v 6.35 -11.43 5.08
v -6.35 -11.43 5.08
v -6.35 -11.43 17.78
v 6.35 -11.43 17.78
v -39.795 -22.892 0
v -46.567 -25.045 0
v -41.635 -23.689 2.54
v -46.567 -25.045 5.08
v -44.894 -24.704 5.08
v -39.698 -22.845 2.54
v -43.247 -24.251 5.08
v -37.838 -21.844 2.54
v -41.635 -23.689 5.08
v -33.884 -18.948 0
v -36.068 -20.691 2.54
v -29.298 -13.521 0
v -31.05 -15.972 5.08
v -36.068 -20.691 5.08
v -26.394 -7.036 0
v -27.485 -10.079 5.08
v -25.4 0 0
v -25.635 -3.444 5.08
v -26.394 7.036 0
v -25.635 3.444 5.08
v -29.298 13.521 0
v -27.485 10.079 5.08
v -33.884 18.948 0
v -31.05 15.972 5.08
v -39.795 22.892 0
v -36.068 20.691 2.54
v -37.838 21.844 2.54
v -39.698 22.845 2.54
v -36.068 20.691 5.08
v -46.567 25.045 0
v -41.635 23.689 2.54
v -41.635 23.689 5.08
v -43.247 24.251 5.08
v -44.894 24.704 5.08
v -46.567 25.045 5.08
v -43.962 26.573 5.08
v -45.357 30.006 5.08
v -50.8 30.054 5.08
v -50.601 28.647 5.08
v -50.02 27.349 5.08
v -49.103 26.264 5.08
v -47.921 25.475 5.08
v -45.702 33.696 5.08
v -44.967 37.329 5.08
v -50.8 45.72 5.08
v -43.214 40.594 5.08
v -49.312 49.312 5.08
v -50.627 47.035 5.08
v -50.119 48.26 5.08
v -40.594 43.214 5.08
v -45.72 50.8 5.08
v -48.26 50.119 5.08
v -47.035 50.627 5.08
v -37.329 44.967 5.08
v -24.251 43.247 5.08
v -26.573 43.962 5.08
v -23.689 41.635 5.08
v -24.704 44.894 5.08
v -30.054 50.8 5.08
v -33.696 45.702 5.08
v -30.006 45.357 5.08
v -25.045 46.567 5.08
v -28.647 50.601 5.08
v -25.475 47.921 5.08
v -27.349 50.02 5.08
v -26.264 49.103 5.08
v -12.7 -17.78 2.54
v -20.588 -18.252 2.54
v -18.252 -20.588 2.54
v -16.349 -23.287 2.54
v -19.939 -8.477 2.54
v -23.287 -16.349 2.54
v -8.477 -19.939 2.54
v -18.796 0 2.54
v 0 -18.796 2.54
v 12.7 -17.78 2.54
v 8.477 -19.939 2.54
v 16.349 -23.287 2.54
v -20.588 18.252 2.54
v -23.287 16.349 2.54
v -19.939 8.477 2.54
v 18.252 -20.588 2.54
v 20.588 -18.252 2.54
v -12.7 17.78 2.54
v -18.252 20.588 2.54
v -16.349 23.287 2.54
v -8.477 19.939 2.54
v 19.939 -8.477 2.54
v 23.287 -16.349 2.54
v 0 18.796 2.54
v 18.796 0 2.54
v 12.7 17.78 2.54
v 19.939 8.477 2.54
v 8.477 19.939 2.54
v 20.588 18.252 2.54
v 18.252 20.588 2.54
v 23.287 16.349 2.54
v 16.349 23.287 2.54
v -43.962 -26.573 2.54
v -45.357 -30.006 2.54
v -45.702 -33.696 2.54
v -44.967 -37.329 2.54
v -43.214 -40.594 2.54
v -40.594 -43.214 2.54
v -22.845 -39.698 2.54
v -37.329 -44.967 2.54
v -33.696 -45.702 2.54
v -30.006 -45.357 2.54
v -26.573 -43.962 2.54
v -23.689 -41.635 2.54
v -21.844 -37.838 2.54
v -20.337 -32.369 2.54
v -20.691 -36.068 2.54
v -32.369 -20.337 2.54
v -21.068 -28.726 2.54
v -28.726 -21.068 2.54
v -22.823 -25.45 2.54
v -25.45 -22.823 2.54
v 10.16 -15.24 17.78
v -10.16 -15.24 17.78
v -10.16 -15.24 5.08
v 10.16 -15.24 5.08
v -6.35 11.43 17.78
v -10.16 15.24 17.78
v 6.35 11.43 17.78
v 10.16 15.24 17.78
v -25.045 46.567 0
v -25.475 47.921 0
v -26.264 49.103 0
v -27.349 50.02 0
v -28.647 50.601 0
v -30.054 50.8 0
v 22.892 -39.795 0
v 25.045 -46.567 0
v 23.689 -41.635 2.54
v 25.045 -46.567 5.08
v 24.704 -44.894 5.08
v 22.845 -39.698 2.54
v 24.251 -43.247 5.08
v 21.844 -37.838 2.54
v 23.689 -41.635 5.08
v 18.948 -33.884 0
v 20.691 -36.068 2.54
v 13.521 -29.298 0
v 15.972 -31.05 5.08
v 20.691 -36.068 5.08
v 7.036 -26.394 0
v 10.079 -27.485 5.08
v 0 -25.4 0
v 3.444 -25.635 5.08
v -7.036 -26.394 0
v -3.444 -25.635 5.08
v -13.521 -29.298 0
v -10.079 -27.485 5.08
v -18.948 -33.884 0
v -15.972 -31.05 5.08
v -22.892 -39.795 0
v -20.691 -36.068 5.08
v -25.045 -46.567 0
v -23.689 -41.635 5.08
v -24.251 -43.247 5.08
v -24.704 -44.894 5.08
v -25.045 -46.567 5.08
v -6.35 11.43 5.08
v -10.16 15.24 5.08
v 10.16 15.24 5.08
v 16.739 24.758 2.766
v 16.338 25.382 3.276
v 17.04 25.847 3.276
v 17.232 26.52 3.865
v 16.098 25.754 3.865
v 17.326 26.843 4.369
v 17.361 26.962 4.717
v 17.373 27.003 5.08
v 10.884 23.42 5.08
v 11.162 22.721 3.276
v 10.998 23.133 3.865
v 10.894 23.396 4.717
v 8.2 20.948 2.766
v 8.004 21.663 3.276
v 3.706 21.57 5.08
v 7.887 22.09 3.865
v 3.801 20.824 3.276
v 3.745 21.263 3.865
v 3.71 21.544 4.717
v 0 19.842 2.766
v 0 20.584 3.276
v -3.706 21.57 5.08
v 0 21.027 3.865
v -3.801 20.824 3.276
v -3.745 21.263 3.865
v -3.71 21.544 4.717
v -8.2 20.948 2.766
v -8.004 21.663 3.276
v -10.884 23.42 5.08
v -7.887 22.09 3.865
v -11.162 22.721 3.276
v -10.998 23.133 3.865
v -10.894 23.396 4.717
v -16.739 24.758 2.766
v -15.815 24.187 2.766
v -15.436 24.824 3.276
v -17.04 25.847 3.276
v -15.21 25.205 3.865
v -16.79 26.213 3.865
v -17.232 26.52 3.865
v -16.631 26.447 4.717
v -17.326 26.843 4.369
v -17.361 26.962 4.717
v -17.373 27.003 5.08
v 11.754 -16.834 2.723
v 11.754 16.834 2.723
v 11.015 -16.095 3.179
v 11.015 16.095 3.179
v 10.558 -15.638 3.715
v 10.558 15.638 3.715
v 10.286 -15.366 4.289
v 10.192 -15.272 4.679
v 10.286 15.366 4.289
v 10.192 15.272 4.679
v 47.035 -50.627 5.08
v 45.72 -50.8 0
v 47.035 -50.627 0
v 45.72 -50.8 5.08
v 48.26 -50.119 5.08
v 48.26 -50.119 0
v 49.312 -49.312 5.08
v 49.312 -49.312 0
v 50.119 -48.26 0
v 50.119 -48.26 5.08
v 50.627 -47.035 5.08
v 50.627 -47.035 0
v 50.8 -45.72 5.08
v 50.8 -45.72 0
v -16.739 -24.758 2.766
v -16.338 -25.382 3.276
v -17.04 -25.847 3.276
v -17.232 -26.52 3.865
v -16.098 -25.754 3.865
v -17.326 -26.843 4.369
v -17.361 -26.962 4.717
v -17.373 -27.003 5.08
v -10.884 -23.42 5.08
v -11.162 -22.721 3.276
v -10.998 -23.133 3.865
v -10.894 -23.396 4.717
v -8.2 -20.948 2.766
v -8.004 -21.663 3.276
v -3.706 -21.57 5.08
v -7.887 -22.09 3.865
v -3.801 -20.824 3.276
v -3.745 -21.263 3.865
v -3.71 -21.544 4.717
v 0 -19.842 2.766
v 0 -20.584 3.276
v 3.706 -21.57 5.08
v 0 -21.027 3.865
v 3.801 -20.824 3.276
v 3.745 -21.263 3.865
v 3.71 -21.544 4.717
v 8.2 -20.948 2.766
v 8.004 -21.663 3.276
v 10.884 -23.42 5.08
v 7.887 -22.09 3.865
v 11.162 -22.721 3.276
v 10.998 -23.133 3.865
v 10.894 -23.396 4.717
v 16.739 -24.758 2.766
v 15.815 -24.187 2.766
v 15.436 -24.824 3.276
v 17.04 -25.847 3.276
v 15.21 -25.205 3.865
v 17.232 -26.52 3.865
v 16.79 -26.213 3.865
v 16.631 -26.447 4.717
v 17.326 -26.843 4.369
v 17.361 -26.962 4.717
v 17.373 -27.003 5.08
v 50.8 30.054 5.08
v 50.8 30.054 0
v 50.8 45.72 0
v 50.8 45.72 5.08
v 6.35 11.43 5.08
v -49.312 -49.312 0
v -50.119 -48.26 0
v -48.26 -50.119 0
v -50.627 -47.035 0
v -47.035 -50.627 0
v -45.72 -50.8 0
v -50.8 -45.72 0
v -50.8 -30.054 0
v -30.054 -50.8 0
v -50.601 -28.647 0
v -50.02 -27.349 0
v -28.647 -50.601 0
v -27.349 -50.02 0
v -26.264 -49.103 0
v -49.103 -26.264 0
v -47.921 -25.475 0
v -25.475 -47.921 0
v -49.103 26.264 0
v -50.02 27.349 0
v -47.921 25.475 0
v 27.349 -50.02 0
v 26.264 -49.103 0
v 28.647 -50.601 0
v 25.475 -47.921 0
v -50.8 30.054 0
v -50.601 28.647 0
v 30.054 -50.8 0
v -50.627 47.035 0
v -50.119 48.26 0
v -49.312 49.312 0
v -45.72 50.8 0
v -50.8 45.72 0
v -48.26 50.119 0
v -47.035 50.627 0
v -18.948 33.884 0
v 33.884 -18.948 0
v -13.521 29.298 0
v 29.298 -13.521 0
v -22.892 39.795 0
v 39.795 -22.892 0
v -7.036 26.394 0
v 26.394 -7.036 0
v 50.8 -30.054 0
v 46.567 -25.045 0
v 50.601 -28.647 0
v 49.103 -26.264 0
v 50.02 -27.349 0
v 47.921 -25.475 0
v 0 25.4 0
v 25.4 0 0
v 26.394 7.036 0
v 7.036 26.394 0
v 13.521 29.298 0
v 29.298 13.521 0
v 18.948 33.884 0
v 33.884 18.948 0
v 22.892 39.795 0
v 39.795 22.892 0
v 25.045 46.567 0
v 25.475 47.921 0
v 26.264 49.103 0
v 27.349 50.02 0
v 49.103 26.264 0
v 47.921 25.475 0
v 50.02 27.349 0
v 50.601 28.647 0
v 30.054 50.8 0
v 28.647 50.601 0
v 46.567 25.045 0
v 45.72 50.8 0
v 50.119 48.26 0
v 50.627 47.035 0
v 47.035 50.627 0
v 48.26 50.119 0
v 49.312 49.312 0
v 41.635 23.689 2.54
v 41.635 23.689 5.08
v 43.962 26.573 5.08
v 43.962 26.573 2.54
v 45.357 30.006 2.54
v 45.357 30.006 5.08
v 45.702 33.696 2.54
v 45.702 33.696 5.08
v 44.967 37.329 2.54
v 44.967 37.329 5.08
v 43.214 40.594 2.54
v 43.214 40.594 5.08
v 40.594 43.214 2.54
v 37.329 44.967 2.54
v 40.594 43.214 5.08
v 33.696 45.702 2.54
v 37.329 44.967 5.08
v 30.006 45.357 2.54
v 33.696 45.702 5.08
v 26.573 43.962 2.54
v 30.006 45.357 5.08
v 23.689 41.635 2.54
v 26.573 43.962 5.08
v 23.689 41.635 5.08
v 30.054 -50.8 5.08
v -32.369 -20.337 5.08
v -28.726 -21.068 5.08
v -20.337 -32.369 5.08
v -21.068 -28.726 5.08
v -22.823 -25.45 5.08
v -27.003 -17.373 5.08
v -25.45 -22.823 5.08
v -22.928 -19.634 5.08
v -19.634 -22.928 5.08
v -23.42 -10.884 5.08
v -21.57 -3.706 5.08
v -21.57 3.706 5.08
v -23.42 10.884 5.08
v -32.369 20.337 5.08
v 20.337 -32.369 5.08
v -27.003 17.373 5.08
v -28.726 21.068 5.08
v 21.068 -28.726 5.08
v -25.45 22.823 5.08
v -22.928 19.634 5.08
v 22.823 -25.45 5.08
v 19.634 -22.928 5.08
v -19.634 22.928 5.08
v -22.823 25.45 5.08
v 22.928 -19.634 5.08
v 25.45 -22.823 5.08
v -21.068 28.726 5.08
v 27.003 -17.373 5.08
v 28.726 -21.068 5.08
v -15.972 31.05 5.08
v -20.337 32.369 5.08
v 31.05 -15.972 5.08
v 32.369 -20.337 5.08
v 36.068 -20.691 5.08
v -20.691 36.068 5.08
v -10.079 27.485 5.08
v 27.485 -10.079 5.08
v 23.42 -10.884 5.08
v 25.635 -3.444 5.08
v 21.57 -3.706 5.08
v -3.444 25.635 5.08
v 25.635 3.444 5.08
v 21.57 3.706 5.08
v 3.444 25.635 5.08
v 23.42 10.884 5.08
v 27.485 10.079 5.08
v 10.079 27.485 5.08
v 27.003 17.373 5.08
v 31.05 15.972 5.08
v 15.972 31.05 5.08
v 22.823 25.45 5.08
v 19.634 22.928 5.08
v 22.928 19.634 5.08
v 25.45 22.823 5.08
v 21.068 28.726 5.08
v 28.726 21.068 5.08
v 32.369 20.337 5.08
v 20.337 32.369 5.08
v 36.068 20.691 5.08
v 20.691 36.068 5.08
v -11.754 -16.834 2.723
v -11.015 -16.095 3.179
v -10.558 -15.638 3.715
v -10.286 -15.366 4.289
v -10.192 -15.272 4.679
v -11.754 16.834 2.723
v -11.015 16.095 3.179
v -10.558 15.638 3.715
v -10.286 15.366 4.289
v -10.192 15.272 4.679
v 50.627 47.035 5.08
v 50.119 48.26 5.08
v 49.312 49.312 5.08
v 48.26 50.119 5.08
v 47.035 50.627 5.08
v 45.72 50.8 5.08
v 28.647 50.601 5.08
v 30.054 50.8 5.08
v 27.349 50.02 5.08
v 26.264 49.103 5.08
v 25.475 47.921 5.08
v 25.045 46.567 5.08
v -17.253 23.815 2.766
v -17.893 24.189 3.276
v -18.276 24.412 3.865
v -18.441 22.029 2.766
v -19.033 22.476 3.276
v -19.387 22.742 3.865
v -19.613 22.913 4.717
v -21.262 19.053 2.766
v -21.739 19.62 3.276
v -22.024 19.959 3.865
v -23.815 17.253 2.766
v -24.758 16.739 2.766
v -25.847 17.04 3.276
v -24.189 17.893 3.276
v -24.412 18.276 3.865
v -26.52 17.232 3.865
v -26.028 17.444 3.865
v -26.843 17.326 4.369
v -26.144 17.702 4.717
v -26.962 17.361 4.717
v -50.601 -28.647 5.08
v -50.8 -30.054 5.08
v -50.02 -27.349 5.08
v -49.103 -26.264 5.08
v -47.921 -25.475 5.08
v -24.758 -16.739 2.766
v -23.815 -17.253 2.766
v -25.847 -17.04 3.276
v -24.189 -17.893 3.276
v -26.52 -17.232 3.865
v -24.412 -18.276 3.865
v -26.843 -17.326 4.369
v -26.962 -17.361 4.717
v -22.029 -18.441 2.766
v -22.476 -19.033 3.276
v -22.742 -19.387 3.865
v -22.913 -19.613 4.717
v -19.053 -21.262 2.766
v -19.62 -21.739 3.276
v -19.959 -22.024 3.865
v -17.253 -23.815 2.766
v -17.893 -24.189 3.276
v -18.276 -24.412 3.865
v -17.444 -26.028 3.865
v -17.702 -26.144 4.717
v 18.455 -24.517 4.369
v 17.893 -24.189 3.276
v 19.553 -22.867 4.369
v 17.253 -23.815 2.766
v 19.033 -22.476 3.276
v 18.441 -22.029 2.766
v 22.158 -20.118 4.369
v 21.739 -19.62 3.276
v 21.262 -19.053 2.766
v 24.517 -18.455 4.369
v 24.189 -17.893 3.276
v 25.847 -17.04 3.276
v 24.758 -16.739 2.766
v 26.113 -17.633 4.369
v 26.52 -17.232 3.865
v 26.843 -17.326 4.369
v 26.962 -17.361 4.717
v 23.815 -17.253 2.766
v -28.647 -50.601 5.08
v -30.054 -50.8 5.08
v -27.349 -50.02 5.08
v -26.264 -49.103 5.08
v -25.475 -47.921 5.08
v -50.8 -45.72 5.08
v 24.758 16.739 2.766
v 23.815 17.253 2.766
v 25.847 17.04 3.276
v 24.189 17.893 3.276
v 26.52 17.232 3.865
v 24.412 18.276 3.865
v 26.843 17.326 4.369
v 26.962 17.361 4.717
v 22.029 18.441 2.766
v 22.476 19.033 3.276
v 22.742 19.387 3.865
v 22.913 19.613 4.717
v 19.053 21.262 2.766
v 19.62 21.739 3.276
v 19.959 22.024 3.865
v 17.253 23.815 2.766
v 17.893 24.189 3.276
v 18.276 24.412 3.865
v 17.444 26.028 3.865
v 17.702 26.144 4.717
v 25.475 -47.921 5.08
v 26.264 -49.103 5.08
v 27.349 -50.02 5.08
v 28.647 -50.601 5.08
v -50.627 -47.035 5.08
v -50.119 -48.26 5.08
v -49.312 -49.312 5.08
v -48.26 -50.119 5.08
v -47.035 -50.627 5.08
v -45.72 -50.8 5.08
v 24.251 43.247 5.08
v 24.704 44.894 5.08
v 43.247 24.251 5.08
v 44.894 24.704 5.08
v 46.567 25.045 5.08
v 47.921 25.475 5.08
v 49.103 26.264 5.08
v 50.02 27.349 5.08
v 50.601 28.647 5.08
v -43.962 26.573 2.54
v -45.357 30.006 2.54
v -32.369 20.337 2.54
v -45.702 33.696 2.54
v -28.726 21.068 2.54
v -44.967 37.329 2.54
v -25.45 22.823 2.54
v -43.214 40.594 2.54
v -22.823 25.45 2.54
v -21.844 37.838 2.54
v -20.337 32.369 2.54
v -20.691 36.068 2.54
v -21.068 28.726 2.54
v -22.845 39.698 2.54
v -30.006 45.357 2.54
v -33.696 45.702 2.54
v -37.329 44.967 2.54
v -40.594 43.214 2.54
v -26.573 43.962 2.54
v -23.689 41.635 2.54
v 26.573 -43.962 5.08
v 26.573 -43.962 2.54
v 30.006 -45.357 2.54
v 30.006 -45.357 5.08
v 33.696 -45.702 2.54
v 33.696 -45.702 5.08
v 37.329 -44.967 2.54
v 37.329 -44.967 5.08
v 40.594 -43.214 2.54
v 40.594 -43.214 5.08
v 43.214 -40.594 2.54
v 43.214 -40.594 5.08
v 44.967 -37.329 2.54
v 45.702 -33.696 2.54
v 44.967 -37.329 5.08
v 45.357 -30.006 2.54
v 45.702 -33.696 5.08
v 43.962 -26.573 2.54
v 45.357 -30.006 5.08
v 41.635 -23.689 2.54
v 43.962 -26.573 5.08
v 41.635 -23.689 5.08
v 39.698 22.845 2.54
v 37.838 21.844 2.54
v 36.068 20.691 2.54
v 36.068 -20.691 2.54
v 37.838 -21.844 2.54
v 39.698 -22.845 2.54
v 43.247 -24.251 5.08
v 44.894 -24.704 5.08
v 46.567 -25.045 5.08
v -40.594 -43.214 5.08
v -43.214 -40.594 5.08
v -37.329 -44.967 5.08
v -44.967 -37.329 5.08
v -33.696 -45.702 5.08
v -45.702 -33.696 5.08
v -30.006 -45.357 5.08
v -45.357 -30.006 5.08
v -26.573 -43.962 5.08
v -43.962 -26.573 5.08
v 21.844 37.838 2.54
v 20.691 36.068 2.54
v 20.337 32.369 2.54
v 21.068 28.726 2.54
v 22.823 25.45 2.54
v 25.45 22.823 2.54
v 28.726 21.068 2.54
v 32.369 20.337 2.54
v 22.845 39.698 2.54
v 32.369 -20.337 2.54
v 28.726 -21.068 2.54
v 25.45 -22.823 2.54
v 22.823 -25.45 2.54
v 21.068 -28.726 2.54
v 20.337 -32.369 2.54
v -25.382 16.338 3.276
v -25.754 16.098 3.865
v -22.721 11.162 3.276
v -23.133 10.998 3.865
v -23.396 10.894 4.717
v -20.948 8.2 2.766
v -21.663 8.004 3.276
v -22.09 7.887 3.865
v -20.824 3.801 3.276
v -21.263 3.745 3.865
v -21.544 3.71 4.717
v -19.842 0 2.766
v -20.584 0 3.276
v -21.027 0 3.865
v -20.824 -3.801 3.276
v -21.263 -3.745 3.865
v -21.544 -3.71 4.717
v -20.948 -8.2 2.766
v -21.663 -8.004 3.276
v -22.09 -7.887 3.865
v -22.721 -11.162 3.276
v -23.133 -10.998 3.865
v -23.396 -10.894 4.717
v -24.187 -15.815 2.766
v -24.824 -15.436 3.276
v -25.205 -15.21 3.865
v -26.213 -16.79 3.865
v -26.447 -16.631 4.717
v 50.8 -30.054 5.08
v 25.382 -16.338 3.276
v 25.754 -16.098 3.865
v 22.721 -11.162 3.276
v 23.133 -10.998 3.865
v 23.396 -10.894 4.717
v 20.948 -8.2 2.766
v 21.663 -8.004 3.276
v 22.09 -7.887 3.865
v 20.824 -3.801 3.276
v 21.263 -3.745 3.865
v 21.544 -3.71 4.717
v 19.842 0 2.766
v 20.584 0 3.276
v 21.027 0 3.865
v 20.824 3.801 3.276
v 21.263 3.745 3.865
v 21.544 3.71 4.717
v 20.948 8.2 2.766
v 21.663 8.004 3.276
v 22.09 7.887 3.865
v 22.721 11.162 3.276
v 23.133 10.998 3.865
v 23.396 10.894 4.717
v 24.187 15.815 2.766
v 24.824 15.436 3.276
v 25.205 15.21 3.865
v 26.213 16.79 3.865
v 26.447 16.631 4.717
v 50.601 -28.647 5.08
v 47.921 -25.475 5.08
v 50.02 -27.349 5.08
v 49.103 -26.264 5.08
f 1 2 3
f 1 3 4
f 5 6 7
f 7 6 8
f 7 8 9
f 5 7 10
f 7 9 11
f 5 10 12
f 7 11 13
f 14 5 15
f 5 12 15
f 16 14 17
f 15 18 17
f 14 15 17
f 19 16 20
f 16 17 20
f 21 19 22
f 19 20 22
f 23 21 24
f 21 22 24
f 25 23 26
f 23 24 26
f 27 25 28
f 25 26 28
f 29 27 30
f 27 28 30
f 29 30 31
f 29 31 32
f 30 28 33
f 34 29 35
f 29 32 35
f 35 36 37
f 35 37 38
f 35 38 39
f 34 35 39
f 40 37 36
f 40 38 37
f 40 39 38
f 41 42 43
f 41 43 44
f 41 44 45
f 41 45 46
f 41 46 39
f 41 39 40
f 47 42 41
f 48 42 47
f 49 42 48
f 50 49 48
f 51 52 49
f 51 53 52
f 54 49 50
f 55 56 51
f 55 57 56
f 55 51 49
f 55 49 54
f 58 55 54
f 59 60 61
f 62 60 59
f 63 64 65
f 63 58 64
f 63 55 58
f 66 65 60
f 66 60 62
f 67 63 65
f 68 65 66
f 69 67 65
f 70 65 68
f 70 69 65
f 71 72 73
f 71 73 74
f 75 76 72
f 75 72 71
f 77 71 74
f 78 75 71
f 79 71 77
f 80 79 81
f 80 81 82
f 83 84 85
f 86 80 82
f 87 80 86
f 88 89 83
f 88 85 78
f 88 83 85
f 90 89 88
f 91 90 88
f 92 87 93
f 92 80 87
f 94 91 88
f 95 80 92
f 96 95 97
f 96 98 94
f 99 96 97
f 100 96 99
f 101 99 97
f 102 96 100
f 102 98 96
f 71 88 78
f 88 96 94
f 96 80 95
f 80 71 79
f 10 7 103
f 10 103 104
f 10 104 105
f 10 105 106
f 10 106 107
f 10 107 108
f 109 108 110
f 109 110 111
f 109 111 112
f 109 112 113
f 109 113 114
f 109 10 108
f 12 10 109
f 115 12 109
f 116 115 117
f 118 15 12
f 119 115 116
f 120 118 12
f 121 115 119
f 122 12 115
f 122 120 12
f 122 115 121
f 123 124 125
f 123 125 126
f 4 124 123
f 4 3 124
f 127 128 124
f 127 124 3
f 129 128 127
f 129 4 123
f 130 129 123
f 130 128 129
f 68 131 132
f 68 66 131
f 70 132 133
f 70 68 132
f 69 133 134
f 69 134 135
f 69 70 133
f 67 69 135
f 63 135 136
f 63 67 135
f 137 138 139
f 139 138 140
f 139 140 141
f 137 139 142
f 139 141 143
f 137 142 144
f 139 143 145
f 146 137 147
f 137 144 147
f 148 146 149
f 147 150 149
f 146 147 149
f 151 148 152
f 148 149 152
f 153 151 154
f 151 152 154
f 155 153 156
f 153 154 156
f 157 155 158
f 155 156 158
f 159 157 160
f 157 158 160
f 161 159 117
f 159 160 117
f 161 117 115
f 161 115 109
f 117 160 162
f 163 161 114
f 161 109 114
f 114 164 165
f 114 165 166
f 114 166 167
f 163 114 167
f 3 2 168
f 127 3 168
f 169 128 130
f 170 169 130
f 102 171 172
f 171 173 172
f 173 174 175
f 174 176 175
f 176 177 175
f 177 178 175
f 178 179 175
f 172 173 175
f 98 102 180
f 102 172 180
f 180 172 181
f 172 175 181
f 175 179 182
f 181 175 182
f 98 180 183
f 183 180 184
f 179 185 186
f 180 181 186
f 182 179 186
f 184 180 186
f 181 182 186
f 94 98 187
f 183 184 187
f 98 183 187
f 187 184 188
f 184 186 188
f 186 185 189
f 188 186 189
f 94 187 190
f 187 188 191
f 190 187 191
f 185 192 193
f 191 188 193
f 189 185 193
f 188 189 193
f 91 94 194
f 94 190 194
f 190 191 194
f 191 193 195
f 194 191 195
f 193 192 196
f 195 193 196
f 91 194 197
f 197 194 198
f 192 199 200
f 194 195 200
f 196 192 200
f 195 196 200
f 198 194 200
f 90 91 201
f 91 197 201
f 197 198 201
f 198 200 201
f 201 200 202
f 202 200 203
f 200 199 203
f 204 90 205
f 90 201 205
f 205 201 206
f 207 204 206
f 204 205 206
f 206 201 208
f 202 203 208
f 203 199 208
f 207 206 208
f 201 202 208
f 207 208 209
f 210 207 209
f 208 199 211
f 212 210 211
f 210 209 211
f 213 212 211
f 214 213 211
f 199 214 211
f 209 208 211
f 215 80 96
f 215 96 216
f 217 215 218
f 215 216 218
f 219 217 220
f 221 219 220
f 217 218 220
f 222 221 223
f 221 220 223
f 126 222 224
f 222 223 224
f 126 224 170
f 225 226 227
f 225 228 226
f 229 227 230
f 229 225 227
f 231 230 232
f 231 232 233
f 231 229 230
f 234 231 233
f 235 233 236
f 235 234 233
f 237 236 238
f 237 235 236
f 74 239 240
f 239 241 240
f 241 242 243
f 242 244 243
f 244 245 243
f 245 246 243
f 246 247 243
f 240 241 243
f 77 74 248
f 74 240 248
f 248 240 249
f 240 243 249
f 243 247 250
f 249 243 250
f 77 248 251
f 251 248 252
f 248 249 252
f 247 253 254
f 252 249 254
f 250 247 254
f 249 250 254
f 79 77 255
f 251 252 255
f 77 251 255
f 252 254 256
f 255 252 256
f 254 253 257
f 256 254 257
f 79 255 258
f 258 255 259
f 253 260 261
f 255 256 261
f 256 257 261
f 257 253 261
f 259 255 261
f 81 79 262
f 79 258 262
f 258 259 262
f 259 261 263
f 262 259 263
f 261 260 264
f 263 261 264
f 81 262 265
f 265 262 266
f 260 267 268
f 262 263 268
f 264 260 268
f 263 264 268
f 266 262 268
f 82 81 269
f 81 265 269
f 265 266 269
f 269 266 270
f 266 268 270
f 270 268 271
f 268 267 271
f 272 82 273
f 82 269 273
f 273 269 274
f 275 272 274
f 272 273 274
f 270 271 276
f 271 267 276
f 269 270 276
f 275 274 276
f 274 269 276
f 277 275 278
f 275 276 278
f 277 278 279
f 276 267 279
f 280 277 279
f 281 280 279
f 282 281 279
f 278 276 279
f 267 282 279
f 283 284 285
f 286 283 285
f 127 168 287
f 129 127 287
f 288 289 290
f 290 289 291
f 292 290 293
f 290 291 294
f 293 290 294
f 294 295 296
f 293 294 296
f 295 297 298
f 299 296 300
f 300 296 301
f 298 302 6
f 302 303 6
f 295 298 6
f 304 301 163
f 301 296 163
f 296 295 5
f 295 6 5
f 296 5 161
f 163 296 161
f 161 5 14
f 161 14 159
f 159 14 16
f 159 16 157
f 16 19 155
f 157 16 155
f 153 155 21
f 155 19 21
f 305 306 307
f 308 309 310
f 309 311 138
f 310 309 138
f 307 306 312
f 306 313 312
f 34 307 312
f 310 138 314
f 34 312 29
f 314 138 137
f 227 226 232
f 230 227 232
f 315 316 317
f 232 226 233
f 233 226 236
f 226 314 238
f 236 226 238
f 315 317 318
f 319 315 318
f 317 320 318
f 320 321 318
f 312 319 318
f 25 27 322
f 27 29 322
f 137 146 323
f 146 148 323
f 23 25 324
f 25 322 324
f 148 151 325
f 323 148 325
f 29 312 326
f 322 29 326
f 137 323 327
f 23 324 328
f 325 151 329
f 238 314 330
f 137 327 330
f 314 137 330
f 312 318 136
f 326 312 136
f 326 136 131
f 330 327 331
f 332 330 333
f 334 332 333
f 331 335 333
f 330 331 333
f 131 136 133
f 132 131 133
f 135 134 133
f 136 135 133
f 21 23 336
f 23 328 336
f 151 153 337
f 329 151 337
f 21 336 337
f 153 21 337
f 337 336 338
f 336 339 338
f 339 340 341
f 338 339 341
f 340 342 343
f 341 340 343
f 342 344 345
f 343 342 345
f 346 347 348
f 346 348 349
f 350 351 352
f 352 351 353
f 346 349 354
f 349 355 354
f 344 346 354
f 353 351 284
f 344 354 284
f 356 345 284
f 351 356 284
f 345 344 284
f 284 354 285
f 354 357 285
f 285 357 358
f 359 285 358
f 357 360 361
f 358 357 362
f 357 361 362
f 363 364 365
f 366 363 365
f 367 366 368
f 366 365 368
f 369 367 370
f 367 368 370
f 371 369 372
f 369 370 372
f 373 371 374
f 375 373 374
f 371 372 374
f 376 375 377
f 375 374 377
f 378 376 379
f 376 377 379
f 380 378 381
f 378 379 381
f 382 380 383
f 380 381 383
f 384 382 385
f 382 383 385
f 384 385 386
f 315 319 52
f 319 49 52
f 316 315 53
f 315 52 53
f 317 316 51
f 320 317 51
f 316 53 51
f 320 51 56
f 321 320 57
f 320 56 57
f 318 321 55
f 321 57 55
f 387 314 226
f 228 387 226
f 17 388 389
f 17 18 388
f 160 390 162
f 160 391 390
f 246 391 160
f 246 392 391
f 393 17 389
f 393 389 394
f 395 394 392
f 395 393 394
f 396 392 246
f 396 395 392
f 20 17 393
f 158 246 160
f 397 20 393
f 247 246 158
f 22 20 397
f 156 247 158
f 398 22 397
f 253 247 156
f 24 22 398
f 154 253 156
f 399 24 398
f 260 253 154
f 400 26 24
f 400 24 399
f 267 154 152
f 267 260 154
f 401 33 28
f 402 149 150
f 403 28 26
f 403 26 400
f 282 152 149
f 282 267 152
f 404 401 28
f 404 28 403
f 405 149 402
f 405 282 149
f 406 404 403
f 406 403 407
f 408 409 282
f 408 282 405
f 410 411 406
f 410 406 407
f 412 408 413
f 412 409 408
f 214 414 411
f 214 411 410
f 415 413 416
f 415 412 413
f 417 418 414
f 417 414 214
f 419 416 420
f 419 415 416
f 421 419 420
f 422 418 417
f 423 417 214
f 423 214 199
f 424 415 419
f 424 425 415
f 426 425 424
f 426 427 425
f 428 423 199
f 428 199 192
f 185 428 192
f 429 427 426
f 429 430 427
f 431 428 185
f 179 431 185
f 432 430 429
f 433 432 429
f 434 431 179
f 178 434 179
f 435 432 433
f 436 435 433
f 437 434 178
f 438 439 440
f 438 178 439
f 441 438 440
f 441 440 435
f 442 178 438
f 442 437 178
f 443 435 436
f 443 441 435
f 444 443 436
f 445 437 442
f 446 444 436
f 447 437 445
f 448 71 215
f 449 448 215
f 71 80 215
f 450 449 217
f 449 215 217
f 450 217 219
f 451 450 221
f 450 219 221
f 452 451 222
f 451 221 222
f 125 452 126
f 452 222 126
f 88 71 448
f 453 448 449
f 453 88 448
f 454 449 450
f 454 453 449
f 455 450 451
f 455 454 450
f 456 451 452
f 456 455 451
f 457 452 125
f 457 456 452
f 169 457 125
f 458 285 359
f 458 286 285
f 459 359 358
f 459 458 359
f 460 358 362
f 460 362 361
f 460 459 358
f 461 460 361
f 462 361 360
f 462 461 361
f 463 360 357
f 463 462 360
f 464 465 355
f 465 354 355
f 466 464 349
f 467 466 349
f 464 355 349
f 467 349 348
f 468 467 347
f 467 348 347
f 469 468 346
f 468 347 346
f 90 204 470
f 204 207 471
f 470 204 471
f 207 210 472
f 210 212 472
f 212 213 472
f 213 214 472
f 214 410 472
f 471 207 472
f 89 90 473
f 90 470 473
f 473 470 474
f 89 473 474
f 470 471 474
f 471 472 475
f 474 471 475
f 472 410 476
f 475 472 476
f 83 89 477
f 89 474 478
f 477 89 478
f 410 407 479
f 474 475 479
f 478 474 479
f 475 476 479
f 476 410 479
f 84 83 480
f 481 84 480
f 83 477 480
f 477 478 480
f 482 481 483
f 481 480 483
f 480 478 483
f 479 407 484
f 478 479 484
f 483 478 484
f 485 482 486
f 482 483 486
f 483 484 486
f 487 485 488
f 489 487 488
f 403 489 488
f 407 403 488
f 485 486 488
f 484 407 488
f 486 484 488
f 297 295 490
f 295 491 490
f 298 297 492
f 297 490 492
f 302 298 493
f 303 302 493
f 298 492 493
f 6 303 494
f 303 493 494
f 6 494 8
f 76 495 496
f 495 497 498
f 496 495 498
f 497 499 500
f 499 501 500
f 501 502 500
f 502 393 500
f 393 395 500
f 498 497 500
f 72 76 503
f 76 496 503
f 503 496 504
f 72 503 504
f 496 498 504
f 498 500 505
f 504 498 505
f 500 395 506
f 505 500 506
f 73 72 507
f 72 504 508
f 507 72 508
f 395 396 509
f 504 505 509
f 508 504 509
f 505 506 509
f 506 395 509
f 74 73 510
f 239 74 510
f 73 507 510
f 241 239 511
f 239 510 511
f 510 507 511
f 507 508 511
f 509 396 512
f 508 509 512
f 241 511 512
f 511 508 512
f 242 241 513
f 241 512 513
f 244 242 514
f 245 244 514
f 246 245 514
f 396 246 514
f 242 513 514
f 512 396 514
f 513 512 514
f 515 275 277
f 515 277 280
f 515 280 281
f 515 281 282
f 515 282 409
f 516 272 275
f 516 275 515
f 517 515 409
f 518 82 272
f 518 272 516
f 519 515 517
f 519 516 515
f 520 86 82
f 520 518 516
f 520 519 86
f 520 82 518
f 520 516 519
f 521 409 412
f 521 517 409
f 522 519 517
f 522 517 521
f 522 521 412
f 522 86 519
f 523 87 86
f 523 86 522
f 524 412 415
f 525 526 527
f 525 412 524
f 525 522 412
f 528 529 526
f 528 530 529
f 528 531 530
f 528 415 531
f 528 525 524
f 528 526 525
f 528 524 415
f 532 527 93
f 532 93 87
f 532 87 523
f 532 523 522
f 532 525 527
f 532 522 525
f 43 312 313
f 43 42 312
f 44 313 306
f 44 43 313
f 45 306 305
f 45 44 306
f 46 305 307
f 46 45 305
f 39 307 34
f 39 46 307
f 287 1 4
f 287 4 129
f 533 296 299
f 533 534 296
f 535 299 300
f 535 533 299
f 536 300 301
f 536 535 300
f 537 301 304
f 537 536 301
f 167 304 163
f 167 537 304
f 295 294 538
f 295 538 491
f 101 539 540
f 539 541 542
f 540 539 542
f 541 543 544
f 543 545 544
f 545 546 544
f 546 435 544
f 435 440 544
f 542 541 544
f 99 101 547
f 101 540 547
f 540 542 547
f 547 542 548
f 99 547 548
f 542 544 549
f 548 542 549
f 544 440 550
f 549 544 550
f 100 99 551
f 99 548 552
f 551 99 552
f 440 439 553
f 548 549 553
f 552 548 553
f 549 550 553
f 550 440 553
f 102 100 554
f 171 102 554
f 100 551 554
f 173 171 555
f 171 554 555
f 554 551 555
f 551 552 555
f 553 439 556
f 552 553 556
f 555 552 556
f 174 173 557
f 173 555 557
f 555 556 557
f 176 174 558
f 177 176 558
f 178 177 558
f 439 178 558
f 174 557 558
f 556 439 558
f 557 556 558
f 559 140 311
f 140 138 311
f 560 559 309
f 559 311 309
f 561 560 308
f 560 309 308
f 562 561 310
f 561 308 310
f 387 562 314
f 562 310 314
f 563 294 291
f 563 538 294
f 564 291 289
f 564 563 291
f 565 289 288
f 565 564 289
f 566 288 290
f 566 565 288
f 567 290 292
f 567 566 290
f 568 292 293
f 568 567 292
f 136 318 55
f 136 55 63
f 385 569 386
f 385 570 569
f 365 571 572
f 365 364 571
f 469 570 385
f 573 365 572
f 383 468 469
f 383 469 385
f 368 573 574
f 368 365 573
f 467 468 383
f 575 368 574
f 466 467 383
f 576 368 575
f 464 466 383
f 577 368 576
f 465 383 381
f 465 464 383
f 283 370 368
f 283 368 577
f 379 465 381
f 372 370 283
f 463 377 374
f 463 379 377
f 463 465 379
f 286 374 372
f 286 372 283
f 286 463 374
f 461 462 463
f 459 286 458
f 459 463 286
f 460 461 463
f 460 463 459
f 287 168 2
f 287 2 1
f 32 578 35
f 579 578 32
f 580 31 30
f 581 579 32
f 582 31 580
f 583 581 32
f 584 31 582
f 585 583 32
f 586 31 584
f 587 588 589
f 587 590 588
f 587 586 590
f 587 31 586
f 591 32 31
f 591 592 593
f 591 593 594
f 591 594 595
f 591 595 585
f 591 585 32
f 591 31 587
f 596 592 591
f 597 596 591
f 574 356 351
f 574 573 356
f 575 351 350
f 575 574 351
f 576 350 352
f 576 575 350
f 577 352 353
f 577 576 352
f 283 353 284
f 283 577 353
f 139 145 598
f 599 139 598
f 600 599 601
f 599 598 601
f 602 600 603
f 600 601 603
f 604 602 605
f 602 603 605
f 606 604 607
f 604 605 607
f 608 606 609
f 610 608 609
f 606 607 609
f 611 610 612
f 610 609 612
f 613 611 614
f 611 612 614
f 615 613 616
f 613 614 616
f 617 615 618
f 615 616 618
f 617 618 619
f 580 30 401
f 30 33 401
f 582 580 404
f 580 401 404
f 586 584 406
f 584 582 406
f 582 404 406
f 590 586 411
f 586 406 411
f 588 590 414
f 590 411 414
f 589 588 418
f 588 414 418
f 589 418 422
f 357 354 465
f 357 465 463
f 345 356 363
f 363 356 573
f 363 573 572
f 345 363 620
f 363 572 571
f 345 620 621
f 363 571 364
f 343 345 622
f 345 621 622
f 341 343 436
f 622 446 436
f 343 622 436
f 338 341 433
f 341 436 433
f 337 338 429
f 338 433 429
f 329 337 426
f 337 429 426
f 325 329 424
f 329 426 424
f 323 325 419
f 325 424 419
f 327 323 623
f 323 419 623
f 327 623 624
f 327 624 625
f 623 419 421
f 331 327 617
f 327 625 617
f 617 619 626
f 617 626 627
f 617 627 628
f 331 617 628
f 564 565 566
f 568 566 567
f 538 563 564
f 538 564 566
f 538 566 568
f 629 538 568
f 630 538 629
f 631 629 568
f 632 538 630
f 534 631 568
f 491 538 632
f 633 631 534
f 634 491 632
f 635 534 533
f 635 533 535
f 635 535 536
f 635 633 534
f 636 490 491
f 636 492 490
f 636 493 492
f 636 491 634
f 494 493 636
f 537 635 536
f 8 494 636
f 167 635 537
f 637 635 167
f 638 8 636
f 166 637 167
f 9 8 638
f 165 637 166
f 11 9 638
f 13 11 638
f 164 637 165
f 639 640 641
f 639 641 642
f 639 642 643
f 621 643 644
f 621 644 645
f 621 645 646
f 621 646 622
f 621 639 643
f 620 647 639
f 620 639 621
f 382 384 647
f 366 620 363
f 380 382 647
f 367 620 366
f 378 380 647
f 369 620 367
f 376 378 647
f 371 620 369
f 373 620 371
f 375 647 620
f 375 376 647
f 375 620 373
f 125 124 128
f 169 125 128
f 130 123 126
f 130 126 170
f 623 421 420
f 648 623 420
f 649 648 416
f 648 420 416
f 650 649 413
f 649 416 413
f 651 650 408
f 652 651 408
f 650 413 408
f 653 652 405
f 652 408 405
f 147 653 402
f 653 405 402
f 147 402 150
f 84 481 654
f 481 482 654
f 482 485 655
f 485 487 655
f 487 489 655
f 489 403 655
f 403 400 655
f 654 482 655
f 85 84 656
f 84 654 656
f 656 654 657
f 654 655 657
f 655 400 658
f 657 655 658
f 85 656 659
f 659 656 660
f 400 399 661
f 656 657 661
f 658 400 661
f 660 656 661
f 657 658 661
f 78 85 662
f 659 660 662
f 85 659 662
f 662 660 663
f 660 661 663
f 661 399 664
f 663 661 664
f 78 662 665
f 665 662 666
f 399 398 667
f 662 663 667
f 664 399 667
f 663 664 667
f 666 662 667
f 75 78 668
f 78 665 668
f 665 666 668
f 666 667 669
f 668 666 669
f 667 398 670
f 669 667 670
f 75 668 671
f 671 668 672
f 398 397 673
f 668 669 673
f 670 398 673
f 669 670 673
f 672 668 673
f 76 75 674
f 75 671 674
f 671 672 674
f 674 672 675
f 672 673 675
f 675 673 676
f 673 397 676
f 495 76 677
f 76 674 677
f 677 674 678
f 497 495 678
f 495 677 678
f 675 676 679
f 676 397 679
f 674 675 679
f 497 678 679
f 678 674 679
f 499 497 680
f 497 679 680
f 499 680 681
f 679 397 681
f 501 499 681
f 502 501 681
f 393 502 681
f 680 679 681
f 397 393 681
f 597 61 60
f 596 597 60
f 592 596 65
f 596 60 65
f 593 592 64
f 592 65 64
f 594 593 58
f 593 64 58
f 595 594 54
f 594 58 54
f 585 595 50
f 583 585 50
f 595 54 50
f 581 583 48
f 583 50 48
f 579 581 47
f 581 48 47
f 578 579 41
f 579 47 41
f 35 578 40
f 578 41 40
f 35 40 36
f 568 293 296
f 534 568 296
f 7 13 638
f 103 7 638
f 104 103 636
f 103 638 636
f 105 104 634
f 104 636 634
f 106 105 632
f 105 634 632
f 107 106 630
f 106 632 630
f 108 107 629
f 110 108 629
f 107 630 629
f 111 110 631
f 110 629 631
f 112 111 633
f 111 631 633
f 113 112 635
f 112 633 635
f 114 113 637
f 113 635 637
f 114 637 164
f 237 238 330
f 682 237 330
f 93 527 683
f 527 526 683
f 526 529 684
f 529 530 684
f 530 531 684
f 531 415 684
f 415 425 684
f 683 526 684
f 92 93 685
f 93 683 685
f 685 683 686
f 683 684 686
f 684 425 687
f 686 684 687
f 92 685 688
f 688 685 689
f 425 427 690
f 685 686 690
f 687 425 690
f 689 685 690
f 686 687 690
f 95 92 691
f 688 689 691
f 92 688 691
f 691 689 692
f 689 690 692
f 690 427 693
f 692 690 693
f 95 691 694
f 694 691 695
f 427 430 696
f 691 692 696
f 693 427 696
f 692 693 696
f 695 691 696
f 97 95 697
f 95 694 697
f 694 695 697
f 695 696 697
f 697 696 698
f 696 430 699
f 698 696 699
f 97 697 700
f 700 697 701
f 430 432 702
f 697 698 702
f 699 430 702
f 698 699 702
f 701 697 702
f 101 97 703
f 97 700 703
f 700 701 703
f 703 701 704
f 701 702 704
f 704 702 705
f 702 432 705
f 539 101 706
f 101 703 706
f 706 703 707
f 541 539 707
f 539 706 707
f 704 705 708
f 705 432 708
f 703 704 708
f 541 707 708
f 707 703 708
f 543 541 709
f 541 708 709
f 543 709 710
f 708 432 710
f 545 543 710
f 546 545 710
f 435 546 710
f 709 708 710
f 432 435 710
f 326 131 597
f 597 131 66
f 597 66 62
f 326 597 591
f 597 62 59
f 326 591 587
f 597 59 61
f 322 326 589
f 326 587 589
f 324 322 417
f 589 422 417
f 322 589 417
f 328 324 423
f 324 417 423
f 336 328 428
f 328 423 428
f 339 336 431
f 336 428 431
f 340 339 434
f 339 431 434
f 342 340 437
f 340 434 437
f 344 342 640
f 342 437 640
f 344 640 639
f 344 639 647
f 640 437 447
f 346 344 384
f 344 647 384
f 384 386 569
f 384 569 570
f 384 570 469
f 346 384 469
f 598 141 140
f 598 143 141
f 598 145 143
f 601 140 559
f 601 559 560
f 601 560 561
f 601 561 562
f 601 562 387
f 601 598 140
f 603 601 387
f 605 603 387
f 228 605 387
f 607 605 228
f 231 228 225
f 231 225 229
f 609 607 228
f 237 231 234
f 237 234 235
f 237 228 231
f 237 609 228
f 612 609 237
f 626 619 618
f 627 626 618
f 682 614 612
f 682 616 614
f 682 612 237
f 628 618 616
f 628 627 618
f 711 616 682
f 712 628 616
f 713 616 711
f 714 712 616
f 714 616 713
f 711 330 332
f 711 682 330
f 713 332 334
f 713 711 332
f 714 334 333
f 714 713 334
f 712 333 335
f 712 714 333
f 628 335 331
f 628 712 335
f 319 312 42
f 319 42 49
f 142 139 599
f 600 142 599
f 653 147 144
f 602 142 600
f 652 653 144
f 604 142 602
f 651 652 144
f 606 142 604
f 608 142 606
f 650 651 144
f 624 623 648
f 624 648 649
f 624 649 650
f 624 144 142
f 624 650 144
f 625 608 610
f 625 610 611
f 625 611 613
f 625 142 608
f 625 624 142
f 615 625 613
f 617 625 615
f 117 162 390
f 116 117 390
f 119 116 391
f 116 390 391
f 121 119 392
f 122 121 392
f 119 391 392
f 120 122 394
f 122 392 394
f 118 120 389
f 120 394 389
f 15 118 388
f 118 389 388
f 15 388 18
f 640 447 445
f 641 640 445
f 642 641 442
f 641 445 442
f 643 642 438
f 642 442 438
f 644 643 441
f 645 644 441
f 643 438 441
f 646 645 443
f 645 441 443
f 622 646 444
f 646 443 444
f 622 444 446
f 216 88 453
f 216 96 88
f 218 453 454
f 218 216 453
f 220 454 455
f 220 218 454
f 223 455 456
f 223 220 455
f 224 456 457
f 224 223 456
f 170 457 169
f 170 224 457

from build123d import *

# Parameters (mm, degrees)
F0_W      = 101.6
F0_H      = 101.6
F1_DEPTH  = 5.08
F2_R      = 12.7
F3_DEPTH  = 2.54
F4_W      = 20.32
F4_H      = 30.48
F4_W_2    = 12.7
F4_H_2    = 22.86
F5_DEPTH  = 12.7
F6_R      = 25.4
F7_DEPTH  = 25.4
F8_R      = 5.08
F9_W      = 20.32
F9_H      = 30.48
F10_DEPTH = 2.54
F11_R     = 2.53999


# Not quite as in the source:
# - a fillet or chamfer is up to 0.001 mm smaller than in the source, because OpenCascade refuses the exact size


with BuildPart() as f1:
    # F0 (on Top) → F1 (new body)
    with BuildSketch(Plane.XY):
        Rectangle(F0_W, F0_H)
    extrude(amount=F1_DEPTH)

    # F2 (on face) → F3 (cut)
    with BuildSketch(Plane.XY.offset(5.08)):
        with Locations((-33.02, 33.02)):
            Circle(F2_R)
        with Locations((33.02, 33.02)):
            Circle(F2_R)
        with Locations((33.02, -33.02)):
            Circle(F2_R)
        with Locations((-33.02, -33.02)):
            Circle(F2_R)
    extrude(amount=-F3_DEPTH, mode=Mode.SUBTRACT)

    # F4 (on face) → F5 (join)
    with BuildSketch(Plane.XY.offset(5.08)):
        Rectangle(F4_W, F4_H)
        Rectangle(F4_W_2, F4_H_2, mode=Mode.SUBTRACT)
    extrude(amount=F5_DEPTH)

    # F6 (on face) → F7 (cut)
    with BuildSketch(Plane.XY.offset(5.08)):
        with Locations((-50.8, 0)):
            Circle(F6_R)
        with Locations((50.8, 0)):
            Circle(F6_R)
        with Locations((0, 50.8)):
            Circle(F6_R)
        with Locations((0, -50.8)):
            Circle(F6_R)
    extrude(amount=-F7_DEPTH, mode=Mode.SUBTRACT)

    # F8
    f8_edges = [f1.edges().sort_by_distance(p)[0] for p in [
        (-50.8, -25.4, 2.54),
        (-50.8, 25.4, 2.54),
        (-50.8, -50.8, 2.54),
        (25.4, -50.8, 2.54),
        (-25.4, -50.8, 2.54),
        (50.8, -50.8, 2.54),
        (50.8, -25.4, 2.54),
        (50.8, 25.4, 2.54),
        (50.8, 50.8, 2.54),
        (-25.4, 50.8, 2.54),
        (25.4, 50.8, 2.54),
        (-50.8, 50.8, 2.54),
    ]]
    fillet(f8_edges, radius=F8_R)

    # F9 (on face) → F10 (cut)
    with BuildSketch(Plane.XY.offset(5.08)):
        with BuildLine():
            ThreePointArc((27.0028755866, -17.3730866956), (21.3360004127, 0), (27.0028755866, 17.3730866956))
            ThreePointArc((27.0028755866, 17.3730866956), (21.166062212, 21.166062212), (17.3730866956, 27.0028755866))
            ThreePointArc((17.3730866956, 27.0028755866), (0, 21.3360004127), (-17.3730866956, 27.0028755866))
            ThreePointArc((-17.3730866956, 27.0028755866), (-21.166062212, 21.166062212), (-27.0028755866, 17.3730866956))
            ThreePointArc((-27.0028755866, 17.3730866956), (-21.3360004127, 0), (-27.0028755866, -17.3730866956))
            ThreePointArc((-27.0028755866, -17.3730866956), (-21.166062212, -21.166062212), (-17.3730866956, -27.0028755866))
            ThreePointArc((-17.3730866956, -27.0028755866), (0, -21.3360004127), (17.3730866956, -27.0028755866))
            ThreePointArc((17.3730866956, -27.0028755866), (21.166062212, -21.166062212), (27.0028755866, -17.3730866956))
        make_face()
        Rectangle(F9_W, F9_H, mode=Mode.SUBTRACT)
    extrude(amount=-F10_DEPTH, mode=Mode.SUBTRACT)

    # F11 (radius 2.54 in the source; OpenCascade refuses exactly that, so slightly less here)
    f11_edges = [f1.edges().sort_by_distance(p)[0] for p in [
        (21.336, 0, 2.54),
        (21.166062, 21.166062, 2.54),
        (0, 21.336, 2.54),
        (-21.166062, 21.166062, 2.54),
        (-21.336, 0, 2.54),
        (-21.166062, -21.166062, 2.54),
        (0, -21.336, 2.54),
        (21.166062, -21.166062, 2.54),
        (-10.16, 0, 2.54),
        (0, 15.24, 2.54),
        (10.16, 0, 2.54),
        (0, -15.24, 2.54),
    ]]
    fillet(f11_edges, radius=F11_R)


solid = f1.part
